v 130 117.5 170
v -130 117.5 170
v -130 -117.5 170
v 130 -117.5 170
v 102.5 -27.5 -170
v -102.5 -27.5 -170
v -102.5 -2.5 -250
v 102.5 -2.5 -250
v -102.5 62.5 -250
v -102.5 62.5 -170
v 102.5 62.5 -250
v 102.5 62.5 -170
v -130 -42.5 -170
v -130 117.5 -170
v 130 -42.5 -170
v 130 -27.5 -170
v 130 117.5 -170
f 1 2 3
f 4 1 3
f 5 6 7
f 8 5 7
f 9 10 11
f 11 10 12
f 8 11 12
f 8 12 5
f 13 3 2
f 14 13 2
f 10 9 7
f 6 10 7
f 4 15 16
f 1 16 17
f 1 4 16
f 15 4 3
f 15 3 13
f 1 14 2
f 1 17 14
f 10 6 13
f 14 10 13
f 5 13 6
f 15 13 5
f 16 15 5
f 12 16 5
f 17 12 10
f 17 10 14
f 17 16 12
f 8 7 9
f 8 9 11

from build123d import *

# Parameters (mm, degrees)
F1_DEPTH = 130
F2_W     = 205
F2_H     = 90
F3_DEPTH = 80
F5_DEPTH = 232.501


with BuildPart() as f1:
    # F0 (on Right) → F1 (new body, symmetric)
    with BuildSketch(Plane.YZ):
        Polygon((117.5, 170), (-117.5, 170), (-42.5, -170), (117.5, -170), align=None)
    extrude(amount=F1_DEPTH, both=True)

    # F2 (on face) → F3 (join)
    with BuildSketch(Plane(origin=(0, 0, -170), x_dir=(1, 0, 0), z_dir=(0, 0, -1))):
        with Locations((0, -17.5)):
            Rectangle(F2_W, F2_H)
    extrude(amount=F3_DEPTH)

    # F4 (on face) → F5 (cut, through all)
    with BuildSketch(Plane(origin=(-102.5, 0, 0), x_dir=(0, -1, 0), z_dir=(-1, 0, 0))):
        Polygon((27.5, -250), (27.5, -170), (2.5, -250), align=None)
    extrude(amount=-F5_DEPTH, mode=Mode.SUBTRACT)


solid = f1.part
